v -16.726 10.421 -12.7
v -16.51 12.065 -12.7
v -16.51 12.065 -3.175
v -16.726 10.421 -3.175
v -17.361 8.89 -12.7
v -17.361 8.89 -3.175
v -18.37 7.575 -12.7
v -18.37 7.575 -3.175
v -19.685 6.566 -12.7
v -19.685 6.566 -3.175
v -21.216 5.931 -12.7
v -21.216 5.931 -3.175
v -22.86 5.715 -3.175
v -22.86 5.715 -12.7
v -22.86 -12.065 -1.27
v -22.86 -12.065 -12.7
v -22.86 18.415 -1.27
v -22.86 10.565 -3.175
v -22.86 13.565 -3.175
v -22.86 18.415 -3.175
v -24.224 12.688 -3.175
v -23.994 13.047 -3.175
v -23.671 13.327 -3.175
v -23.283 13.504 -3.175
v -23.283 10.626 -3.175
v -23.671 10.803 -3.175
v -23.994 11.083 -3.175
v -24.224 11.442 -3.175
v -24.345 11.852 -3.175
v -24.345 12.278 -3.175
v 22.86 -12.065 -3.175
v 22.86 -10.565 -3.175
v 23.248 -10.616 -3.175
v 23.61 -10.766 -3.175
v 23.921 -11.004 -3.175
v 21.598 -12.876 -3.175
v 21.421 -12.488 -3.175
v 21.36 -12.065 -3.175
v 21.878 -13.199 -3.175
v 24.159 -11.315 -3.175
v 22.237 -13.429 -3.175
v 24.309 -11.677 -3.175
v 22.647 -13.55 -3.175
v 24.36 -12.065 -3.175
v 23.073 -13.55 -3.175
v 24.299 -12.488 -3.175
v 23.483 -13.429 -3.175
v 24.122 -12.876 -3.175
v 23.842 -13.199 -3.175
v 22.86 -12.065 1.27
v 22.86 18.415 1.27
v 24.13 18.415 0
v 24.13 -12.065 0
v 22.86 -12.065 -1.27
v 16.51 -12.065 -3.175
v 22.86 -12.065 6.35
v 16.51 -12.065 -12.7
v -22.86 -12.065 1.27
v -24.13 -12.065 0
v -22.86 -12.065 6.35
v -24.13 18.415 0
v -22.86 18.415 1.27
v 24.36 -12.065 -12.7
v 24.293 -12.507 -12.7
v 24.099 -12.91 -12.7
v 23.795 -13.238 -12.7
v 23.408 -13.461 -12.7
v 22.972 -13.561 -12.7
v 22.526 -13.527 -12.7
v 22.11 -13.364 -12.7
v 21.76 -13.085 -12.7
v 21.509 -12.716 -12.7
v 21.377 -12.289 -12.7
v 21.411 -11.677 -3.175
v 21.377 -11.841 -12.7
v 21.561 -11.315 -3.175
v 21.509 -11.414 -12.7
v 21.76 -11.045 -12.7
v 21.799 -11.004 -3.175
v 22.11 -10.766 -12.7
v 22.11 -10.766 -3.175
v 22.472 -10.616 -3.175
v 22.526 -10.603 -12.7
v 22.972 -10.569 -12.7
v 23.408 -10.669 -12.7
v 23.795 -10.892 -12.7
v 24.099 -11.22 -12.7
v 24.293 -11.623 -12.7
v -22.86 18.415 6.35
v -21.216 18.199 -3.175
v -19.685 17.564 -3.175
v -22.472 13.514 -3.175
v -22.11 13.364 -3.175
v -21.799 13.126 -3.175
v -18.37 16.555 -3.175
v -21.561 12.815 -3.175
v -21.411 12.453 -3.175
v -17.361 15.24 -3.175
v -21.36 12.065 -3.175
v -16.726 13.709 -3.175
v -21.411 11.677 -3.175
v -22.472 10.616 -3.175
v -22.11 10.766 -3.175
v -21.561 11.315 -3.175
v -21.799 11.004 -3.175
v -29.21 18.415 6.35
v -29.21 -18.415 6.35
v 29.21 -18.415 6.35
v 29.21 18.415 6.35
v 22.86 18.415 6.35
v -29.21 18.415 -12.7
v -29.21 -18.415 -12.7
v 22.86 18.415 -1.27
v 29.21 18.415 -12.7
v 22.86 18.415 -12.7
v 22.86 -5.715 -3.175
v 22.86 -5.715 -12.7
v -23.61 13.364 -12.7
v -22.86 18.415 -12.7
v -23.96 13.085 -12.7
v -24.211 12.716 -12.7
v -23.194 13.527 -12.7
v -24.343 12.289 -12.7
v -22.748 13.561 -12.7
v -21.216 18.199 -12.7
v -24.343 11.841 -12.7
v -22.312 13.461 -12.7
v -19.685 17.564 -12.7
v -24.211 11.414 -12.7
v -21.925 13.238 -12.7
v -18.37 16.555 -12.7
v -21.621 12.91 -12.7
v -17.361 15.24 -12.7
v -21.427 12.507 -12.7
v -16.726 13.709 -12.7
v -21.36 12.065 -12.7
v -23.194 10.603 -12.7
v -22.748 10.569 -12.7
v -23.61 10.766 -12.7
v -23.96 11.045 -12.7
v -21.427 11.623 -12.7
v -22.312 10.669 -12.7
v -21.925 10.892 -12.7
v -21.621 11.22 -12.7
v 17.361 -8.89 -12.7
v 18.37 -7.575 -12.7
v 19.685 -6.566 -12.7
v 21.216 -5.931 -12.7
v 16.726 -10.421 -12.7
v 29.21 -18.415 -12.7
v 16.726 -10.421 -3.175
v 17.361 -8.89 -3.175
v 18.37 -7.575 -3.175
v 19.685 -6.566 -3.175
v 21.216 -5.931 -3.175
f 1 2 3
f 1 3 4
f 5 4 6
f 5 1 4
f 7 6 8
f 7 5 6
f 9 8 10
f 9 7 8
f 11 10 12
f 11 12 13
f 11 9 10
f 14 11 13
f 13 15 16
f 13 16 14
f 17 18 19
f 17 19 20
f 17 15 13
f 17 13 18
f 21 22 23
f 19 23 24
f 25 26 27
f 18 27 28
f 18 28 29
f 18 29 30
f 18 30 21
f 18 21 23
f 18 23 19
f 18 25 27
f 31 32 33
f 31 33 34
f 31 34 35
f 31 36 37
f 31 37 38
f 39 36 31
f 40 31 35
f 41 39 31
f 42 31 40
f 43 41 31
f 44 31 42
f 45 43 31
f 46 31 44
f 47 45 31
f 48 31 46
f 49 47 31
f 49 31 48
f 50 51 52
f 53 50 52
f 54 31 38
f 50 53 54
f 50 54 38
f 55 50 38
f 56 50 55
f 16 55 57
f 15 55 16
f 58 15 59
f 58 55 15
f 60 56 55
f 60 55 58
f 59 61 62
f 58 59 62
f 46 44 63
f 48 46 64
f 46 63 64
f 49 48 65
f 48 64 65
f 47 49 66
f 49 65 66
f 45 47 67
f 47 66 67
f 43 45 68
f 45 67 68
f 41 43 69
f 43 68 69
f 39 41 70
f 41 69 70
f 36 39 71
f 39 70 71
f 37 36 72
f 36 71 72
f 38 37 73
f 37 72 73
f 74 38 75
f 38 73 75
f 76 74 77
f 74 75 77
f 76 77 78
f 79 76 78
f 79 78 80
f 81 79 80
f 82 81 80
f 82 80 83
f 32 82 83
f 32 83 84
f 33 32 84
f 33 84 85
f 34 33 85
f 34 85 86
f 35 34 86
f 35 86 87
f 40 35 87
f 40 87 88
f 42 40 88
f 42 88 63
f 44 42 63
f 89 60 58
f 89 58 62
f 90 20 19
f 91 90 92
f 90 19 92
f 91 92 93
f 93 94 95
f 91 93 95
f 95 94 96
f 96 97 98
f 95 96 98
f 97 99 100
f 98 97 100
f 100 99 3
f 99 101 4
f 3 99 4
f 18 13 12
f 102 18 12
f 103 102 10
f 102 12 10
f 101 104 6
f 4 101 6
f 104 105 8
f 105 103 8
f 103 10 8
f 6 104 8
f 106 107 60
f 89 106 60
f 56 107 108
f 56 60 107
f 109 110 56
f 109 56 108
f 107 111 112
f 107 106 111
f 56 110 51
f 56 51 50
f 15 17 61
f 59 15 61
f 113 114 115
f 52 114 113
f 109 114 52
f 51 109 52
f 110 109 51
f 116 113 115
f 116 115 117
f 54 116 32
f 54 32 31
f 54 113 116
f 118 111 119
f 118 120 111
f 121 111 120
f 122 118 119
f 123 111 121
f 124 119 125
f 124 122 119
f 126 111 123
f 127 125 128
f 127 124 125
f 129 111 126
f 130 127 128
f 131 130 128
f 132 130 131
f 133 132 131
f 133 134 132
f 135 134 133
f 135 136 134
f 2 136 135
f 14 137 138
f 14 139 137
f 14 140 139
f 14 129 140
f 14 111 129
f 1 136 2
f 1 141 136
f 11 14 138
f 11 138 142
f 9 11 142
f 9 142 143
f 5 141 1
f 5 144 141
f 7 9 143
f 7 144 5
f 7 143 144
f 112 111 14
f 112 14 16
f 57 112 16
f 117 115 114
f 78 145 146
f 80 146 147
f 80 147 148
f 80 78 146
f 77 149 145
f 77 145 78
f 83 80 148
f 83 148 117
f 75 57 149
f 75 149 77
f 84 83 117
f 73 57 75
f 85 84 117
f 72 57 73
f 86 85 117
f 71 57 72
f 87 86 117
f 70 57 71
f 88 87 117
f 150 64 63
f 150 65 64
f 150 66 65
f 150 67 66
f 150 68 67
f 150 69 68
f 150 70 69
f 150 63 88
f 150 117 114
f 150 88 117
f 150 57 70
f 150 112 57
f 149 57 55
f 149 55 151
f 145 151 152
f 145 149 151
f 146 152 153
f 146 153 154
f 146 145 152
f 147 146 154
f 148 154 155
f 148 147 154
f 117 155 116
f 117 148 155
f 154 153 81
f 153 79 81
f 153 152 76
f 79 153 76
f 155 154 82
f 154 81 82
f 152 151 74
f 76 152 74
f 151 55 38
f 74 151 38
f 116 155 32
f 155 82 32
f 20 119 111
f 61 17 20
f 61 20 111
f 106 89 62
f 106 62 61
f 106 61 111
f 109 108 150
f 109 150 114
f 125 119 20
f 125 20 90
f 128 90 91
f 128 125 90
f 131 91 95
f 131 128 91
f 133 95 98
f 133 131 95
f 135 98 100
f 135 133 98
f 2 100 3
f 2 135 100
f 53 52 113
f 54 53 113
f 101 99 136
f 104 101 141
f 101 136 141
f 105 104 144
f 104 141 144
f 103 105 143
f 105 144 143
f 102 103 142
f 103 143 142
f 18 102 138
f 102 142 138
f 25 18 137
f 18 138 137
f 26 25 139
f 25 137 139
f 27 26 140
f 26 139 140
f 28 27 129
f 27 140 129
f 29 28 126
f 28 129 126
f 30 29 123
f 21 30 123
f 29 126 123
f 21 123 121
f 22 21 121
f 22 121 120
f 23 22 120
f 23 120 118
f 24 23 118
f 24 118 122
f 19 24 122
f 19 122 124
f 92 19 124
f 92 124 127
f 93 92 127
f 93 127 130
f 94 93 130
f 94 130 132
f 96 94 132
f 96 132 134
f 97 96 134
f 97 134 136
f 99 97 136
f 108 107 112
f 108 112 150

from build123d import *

# Parameters (mm, degrees)
F1_DEPTH      = 6.35
F1_DEPTH_BACK = 12.7
F3_DEPTH      = 30.48
F5_DEPTH      = 9.525
F6_R          = 1.5
F7_DEPTH      = 9.525


with BuildPart() as f1:
    # F0 (on Top) → F1 (new body, two sides)
    with BuildSketch(Plane.XY) as f1_sk:
        Polygon((-29.2099994576, 18.4149997288), (-29.2099994576, -18.4149997288), (29.2099994576, -18.4149997288), (29.2099994576, 18.4149997288), (22.86, 18.4149997288), (22.86, -12.0650002712), (-22.86, -12.0650002712), (-22.86, 18.4149997288), align=None)
    extrude(amount=F1_DEPTH)
    extrude(f1_sk.sketch, amount=-F1_DEPTH_BACK)

    # F2 (on face) → F3 (cut)
    with BuildSketch(Plane(origin=(0, 18.4149997288, 0), x_dir=(-1, 0, 0), z_dir=(0, 1, 0))):
        Polygon((0, 24.13), (-24.13, 0), (0, -24.13), (22.86, -1.27), (22.86, 1.27), align=None)
        Polygon((24.13, 0), (22.86, 1.27), (22.86, -1.27), align=None)
    extrude(amount=-F3_DEPTH, mode=Mode.SUBTRACT)

    # F4 (on face) → F5 (join)
    with BuildSketch(Plane(origin=(0, 0, -12.7), x_dir=(1, 0, 0), z_dir=(0, 0, -1))):
        with BuildLine():
            Line((-22.86, -5.7149997288), (-22.86, -18.4149997288))
            ThreePointArc((-22.86, -18.4149997288), (-18.3698719395, -16.5551277893), (-16.51, -12.0649997288))
            ThreePointArc((-16.51, -12.0649997288), (-18.3698719395, -7.5748716683), (-22.86, -5.7149997288))
        make_face()
        with BuildLine():
            Line((22.86, 12.0650002712), (16.51, 12.0650002712))
            ThreePointArc((16.51, 12.0650002712), (18.3698719395, 7.5748722107), (22.86, 5.7150002712))
            Line((22.86, 5.7150002712), (22.86, 12.0650002712))
        make_face()
    extrude(amount=-F5_DEPTH)

    # F6 (on face) → F7 (cut)
    with BuildSketch(Plane(origin=(0, 0, -12.7), x_dir=(1, 0, 0), z_dir=(0, 0, -1))):
        with Locations((22.86, 12.0650002712)):
            Circle(F6_R)
        with Locations((-22.86, -12.0649997288)):
            Circle(F6_R)
    extrude(amount=-F7_DEPTH, mode=Mode.SUBTRACT)


solid = f1.part
